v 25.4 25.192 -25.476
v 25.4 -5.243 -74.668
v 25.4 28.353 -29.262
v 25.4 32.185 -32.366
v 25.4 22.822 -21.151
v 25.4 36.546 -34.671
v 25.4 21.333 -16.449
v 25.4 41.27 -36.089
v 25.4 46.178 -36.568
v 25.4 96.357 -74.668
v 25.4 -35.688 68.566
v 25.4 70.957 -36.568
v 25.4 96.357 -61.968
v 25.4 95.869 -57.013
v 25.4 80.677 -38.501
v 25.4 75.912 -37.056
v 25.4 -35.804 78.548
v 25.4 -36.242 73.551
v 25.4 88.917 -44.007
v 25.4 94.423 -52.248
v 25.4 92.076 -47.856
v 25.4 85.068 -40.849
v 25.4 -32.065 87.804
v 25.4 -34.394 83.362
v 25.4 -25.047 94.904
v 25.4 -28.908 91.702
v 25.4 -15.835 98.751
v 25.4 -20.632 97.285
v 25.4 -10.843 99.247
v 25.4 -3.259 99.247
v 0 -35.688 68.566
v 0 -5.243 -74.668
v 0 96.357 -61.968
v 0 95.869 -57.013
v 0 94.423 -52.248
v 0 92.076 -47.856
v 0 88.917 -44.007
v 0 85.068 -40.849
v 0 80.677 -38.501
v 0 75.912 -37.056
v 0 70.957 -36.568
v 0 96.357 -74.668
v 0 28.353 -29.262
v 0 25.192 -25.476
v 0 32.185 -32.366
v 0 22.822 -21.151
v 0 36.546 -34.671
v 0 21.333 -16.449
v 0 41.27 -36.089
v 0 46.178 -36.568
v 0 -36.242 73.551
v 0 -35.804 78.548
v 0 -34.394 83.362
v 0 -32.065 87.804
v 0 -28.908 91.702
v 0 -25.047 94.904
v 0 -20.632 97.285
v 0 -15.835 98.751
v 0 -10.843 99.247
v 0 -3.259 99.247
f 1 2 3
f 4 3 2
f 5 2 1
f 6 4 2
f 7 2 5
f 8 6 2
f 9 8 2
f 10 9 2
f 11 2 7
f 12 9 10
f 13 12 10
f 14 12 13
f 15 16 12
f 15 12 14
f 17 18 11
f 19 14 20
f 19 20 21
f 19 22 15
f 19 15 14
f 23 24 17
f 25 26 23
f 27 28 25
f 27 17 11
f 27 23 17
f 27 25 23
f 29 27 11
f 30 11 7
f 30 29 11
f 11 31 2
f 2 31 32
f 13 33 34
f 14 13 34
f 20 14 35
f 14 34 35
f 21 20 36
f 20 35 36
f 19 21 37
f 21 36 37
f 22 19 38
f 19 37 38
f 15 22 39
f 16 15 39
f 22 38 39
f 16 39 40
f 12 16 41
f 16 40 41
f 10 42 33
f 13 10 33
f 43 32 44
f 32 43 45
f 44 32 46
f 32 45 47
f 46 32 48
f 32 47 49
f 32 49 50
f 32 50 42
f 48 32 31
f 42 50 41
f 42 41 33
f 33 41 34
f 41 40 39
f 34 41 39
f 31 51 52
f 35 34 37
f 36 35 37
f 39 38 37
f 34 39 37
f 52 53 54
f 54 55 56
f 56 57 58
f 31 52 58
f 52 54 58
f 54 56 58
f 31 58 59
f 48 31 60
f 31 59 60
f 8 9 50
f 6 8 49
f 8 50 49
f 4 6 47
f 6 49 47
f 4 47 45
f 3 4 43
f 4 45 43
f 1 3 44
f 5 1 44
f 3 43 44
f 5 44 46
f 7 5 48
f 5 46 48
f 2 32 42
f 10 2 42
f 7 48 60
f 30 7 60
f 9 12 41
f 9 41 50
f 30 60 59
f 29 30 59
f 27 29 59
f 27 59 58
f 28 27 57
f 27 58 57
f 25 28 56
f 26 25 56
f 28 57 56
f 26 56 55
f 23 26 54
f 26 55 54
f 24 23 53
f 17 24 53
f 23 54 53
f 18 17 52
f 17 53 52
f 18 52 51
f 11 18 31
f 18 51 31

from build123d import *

# Parameters (mm, degrees)
F1_DEPTH = 25.4


with BuildPart() as f1:
    # F0 (on Right) → F1 (new body)
    with BuildSketch(Plane.YZ):
        with BuildLine():
            ThreePointArc((-10.843395, 99.24675), (-30.582903, 89.831488), (-35.688344, 68.565793))
            Line((-35.688344, 68.565793), (-5.243084, -74.667893))
            Line((-5.243084, -74.667893), (96.356916, -74.667893))
            Line((96.356916, -74.667893), (96.356916, -61.967893))
            ThreePointArc((96.356916, -61.967893), (88.917428, -44.007381), (70.956916, -36.567893))
            Line((70.956916, -36.567893), (46.178202, -36.567893))
            ThreePointArc((46.178202, -36.567893), (30.193464, -30.907401), (21.333253, -16.44885))
            Line((21.333253, -16.44885), (-3.258606, 99.24675))
            Line((-3.258606, 99.24675), (-10.843395, 99.24675))
        make_face()
    extrude(amount=F1_DEPTH)


solid = f1.part
